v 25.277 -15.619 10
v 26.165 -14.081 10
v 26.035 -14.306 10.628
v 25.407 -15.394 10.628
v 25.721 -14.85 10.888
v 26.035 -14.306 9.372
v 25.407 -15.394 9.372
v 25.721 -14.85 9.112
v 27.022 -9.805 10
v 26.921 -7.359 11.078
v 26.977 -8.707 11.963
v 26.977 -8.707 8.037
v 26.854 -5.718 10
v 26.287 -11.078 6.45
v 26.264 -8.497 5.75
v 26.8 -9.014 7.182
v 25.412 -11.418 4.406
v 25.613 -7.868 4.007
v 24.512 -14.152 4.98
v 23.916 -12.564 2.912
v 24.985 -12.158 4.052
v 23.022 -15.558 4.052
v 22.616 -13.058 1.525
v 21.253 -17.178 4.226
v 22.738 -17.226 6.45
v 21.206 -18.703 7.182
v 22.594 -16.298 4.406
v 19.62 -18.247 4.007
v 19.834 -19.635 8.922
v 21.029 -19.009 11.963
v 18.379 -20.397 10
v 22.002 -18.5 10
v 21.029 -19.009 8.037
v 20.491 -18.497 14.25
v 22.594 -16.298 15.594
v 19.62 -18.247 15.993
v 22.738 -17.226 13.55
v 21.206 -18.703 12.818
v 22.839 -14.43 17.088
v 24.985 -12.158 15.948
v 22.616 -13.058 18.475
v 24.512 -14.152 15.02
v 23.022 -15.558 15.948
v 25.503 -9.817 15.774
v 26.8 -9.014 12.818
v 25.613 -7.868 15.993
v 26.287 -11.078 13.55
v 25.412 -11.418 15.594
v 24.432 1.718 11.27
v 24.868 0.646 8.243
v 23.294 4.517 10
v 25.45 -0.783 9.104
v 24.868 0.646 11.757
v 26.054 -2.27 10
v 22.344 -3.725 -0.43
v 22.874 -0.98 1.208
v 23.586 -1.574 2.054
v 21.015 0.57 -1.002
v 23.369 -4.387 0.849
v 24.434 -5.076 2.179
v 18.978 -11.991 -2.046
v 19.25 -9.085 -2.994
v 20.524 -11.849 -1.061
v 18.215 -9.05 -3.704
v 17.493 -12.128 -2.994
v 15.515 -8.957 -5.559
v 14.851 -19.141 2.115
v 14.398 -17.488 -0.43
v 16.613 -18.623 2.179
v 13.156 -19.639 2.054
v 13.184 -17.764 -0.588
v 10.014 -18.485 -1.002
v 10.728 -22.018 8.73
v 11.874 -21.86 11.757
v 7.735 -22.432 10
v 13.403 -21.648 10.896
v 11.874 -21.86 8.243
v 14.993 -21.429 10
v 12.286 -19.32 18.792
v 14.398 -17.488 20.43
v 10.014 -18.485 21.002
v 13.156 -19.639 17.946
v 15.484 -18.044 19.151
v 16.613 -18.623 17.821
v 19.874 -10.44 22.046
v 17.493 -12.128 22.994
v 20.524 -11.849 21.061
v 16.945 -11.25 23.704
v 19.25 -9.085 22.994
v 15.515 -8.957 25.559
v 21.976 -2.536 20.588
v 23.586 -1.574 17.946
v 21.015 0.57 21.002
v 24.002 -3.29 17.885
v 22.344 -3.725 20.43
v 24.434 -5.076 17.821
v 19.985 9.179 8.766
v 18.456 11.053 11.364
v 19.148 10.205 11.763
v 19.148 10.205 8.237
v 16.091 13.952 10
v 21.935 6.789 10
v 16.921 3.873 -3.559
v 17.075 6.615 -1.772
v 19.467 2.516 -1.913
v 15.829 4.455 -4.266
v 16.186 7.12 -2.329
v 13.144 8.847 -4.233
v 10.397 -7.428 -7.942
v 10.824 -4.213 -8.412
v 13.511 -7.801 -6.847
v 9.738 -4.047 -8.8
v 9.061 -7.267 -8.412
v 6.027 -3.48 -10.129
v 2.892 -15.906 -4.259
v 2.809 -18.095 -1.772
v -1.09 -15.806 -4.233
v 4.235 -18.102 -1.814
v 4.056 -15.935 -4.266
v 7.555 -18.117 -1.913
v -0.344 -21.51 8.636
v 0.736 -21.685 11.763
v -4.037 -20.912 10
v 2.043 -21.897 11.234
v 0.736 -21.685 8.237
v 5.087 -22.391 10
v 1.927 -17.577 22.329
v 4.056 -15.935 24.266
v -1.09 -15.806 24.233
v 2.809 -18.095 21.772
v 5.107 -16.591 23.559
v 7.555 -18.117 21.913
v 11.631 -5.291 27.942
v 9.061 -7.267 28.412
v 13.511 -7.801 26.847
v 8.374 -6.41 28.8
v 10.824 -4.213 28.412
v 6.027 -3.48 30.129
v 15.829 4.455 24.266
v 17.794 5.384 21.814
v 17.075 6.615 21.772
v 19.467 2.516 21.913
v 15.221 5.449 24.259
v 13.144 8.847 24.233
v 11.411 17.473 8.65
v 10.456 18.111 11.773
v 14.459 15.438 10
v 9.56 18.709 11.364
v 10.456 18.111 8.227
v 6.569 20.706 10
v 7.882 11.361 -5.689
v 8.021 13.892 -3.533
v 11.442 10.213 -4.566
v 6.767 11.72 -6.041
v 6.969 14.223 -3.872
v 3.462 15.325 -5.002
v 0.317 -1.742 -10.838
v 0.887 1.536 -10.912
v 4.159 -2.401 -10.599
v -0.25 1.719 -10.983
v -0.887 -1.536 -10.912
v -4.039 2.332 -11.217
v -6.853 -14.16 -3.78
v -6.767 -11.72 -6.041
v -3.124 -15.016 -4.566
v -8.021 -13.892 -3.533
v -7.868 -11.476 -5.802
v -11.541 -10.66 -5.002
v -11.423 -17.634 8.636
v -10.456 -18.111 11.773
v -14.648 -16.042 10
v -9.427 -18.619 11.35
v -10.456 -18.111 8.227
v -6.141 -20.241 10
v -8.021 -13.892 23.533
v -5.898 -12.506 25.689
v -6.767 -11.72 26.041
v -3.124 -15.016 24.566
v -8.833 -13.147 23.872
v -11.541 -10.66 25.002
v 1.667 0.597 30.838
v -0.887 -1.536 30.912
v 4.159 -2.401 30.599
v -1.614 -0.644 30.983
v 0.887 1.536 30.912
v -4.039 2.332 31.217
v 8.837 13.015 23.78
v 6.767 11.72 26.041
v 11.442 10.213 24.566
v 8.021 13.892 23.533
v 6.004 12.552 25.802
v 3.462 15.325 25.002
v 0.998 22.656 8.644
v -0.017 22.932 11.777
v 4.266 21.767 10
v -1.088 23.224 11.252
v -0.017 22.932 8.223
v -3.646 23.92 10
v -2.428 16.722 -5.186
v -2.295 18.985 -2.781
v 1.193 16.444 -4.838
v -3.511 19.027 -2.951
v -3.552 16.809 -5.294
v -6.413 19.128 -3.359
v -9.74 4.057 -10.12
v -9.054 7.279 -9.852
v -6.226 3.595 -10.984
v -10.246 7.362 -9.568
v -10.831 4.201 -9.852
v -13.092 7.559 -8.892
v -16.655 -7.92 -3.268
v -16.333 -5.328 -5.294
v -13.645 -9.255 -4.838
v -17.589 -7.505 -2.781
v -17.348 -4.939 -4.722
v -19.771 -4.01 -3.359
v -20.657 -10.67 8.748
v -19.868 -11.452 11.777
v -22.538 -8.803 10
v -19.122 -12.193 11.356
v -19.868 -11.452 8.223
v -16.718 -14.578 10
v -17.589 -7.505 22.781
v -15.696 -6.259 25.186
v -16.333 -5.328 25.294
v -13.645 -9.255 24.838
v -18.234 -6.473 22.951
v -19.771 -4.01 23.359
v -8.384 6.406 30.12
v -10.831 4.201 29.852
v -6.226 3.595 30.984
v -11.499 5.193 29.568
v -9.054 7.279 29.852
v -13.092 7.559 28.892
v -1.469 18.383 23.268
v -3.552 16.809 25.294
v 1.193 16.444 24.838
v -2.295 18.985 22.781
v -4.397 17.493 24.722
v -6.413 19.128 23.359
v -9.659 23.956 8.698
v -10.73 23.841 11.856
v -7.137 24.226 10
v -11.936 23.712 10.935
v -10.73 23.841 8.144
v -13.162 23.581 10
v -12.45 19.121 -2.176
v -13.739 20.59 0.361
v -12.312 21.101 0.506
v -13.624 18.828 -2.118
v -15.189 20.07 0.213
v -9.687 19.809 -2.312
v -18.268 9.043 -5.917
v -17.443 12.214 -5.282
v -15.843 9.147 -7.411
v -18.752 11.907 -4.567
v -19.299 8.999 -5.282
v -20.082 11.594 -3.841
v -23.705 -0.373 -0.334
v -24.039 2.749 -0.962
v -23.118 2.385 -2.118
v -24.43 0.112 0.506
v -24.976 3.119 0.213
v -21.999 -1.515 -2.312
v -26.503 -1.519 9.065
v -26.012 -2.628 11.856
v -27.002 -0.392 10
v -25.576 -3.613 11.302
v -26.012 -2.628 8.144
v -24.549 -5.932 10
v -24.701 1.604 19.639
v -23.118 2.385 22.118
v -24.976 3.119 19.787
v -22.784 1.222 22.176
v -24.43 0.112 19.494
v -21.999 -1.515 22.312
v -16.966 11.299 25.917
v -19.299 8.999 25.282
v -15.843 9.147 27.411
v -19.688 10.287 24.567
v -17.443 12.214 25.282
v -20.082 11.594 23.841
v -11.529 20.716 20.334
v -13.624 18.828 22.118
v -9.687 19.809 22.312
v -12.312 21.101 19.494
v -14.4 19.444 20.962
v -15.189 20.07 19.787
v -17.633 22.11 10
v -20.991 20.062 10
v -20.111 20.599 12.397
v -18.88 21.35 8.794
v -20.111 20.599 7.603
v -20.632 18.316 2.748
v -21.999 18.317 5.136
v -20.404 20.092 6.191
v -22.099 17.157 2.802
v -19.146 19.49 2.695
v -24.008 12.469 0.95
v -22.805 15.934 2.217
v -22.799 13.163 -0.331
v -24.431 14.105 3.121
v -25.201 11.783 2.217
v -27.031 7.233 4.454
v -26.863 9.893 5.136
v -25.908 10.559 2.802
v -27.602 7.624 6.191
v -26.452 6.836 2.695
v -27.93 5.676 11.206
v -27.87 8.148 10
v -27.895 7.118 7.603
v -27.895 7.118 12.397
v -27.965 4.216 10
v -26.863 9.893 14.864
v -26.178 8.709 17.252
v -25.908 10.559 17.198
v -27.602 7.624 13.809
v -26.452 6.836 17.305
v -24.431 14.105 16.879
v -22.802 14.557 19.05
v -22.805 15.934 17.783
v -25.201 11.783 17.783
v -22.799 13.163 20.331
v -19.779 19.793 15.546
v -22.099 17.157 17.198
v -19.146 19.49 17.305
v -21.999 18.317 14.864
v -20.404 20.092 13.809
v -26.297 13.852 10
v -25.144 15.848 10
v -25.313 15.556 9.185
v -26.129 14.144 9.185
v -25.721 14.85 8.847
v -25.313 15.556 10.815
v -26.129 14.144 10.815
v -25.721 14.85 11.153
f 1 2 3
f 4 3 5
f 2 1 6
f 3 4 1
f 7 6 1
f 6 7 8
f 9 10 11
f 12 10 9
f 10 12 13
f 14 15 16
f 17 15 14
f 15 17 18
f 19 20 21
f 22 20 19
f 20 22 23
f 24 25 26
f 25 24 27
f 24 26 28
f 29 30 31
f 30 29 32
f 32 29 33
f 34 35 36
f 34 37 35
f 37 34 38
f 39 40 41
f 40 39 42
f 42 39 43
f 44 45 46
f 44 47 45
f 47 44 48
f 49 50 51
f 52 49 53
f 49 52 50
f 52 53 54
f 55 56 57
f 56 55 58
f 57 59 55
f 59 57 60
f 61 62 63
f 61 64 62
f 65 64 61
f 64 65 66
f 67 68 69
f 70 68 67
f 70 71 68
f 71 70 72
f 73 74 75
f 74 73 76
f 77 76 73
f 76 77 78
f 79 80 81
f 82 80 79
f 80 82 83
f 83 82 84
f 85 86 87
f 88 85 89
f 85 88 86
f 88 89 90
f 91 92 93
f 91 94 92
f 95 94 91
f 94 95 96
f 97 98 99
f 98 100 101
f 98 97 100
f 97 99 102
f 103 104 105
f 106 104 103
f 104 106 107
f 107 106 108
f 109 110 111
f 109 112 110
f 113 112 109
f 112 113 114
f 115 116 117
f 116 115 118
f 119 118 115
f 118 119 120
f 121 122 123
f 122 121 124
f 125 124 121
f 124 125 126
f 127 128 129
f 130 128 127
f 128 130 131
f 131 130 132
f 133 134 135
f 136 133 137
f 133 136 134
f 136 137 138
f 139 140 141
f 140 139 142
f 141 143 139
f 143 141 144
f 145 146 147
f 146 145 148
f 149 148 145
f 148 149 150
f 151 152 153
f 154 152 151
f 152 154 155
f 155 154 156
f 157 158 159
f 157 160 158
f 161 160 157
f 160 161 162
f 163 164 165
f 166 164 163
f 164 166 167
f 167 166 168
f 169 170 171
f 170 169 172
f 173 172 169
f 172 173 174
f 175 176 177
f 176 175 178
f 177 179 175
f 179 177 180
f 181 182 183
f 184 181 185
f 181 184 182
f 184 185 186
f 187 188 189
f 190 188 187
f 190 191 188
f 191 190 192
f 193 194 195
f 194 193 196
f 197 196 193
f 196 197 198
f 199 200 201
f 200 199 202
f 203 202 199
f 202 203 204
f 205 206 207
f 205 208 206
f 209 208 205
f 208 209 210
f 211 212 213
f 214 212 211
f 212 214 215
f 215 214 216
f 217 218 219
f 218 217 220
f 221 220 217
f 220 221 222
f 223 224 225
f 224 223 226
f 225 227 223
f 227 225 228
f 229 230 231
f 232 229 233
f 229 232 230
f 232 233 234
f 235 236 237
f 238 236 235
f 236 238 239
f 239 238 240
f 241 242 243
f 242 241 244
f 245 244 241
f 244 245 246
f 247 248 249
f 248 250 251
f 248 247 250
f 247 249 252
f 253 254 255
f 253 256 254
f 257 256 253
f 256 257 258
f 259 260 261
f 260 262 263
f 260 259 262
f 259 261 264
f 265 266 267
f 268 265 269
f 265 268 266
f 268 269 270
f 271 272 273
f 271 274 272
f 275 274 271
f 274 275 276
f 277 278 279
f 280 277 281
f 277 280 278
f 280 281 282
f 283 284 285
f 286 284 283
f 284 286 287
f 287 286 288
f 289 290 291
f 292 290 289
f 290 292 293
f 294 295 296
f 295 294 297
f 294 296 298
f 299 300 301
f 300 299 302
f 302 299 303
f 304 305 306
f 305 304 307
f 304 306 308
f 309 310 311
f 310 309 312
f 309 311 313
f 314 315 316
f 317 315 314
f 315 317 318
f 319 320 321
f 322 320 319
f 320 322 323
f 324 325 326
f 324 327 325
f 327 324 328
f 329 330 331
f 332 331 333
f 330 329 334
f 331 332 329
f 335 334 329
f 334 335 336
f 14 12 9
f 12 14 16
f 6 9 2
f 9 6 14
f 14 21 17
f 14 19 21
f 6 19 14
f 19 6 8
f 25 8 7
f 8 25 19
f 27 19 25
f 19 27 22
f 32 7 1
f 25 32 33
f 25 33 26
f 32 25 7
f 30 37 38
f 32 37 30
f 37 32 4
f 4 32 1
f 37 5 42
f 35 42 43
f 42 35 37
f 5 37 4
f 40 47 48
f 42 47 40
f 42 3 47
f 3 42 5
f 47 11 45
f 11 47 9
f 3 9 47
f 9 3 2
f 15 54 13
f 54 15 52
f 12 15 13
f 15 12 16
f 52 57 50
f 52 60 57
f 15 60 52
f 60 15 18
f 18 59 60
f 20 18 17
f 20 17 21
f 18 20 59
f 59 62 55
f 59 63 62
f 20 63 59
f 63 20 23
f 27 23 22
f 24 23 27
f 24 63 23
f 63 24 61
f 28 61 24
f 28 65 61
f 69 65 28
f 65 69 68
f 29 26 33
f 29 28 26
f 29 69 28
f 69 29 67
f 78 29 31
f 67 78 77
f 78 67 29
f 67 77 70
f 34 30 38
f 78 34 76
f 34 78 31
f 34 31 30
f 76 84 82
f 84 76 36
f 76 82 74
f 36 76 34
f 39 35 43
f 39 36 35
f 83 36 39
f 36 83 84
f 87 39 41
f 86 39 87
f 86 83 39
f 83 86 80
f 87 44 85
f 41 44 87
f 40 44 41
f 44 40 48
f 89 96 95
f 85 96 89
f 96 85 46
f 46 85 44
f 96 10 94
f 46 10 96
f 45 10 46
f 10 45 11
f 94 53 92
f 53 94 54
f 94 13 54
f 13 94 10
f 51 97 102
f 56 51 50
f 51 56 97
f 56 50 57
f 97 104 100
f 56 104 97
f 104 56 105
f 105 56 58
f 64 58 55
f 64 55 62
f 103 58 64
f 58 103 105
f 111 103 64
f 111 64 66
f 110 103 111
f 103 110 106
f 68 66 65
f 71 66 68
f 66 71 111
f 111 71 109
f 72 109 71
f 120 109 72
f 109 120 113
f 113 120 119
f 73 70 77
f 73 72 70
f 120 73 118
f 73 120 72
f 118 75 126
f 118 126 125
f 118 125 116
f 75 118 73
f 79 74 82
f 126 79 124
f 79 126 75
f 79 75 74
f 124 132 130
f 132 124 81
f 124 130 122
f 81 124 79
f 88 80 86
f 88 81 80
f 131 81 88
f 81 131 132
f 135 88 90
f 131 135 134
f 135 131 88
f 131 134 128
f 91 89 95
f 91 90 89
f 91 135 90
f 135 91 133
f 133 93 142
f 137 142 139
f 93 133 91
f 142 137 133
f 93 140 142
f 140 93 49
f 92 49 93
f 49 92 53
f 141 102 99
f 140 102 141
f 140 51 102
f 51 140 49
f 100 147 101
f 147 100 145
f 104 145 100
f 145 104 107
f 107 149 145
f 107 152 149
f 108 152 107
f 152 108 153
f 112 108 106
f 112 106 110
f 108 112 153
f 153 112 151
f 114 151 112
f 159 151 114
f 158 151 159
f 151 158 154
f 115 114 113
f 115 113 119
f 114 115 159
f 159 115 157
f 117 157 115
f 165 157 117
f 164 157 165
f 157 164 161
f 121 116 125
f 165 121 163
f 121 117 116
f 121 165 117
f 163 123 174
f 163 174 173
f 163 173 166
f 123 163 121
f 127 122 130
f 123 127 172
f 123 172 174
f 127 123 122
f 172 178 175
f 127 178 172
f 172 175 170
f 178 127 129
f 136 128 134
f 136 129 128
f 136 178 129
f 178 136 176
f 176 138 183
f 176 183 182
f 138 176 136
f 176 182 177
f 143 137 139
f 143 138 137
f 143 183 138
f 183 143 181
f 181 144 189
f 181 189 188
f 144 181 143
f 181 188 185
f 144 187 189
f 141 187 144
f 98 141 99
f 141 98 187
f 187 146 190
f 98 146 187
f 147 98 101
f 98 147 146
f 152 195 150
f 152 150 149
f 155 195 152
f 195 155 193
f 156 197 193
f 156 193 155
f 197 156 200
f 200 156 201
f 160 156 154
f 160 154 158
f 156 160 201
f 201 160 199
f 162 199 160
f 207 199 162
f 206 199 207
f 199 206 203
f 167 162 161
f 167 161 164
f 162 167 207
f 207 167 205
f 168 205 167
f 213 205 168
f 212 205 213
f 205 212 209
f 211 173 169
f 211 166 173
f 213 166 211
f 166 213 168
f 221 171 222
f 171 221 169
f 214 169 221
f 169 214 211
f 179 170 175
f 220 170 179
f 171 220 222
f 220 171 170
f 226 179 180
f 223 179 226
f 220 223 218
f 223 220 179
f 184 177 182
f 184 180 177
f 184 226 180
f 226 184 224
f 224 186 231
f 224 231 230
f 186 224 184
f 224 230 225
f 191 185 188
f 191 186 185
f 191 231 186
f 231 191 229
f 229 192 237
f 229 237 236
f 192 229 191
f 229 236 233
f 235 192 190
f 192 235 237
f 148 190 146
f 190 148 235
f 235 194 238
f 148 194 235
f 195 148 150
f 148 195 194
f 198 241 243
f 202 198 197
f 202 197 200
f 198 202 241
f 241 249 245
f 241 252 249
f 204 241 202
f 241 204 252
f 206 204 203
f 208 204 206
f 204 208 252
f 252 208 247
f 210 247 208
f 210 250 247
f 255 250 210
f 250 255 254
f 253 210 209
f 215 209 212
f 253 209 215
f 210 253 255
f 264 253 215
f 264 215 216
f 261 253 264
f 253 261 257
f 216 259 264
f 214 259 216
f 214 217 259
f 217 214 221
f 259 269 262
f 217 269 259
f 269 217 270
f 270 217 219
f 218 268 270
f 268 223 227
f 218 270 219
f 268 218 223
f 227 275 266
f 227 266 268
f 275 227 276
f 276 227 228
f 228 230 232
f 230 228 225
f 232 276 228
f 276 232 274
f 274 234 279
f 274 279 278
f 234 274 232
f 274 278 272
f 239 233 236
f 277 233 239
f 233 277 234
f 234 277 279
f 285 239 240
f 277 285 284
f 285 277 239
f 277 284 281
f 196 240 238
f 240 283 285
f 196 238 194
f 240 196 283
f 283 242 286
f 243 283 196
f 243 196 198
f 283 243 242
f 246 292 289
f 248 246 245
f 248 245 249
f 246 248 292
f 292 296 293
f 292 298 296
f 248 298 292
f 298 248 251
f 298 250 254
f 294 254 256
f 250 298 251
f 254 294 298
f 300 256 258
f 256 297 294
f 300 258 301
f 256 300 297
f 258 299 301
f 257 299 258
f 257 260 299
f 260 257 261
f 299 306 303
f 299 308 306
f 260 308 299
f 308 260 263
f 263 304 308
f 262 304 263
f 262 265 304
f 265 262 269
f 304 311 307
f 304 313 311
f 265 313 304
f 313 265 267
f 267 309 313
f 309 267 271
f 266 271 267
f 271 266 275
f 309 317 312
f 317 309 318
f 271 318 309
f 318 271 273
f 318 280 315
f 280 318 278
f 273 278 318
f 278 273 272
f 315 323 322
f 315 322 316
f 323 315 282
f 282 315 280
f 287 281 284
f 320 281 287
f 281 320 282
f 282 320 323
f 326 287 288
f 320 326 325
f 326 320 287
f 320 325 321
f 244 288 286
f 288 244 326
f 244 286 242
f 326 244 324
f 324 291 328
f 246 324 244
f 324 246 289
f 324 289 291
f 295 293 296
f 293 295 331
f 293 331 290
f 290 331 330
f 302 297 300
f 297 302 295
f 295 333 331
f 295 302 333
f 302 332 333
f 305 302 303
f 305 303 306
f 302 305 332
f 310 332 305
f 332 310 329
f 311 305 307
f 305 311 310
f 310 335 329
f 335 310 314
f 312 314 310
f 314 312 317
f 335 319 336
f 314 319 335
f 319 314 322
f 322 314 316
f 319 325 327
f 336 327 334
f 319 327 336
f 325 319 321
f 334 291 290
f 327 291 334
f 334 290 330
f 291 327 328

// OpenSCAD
//Easter Egg Maker 2017 from Richard Swika
/* [Egg Symmetry] */
//2014-2017 Richard Swika -  Creative Commons - Attribution - Non-Commercial license.
//Initial Release 4/9/2017
//Rev A: 4/10/2017 
//  - Added Wallpaper Groups 9 of 17
// - Added ability to print decoration and egg separately for dual extrusion
//  - Fixed a few bugs; add/subtract were reversed; spacing edit box was missing from customizer
//

/* [Decoration] */

//Add or subtract decoration from egg (use feature depth to control amount)?
operation="subtract"; //[subtract,add,decoration_only,egg_only]

//Choose a feature to repeat?
feature="square"; //[sphere,star,dot,triangle,square,diamond,pentagon,hexagon,octagon]

//Set the relative size of the feature
size_of_feature=100; //[1:250]

//Number of horizontal loops; impacts pattern and render time (for larger values, use offline)
ucount=8; //[3:16]

//Number of vertical loops; impacts pattern and reander time (for larger values, use offline)
vcount=8; //[3:16]

//Set the relative depth of the feature
feature_depth=10; //

//Set the feature start angle (values like 0, 15, 30 and 45 work best)
start_angle=0; //

//How much feature rotation over the length of the egg (0 for none)?
feature_rotation=0; //

//Vary feature size (yes give a better appearance)?
proportional="yes"; //[yes,no]

/* [placement (wallpaper group) 9 of 17] */
//Select a wallpaper group to control symmetry (google wallpaper group for more information)
group="p1"; //[p1,p2,pm,pg,cm,pmm,pmg,pgg,p4]

//Set some X offset to control the effect of the wallpaper group on symmetrical features (%).
Xoffset=0; //[0:100]

//Set some Y offset to control the effect of the wallpaper group on symmetrical features (%).
Yoffset=0; //[0:100]

//Set some X scaling to control the effect of the wallpaper group on symmetrical features (%)
Xscaling=100; //[10:100]

//Set some Y scaling to control the effect of the wallpaper group on symmetrical features (%)
Yscaling=100; //[10:100]

/* [Size and Shape] */
//Length of the egg (mm)?.
egg_length=60; //[30:200]

//What shape egg? (use 7 for a hen egg; 0 for a sphere; 100 for a blimp)
egg_shape=7; //[0:100]

//What percentage of the interior should be hollow (0 for totally solid)
interior=85; //[0:95]

//Do you want the inside to be smooth or decorated? (hollow bisected eggs only)
inside="smooth"; //[smooth,decorated]

/* [Printing] */
//Do you want it bisected? (IMPORTANT: YES for printing, NO during preview.)
bisect="no"; //[yes,no]

//Do you want to add a joiner to hold the egg together? (hollow bisected eggs only)
joiner="attached"; //[attached,detached,none]

//Set the spacing between parts on the build plate in mm
spacing=2; //[2:10]

/* [Hidden] */
// preview[view:top, tilt:top]
tiny=0.001;

//set true to turn off the demo egg so you can use the modules instead
moduleMode=false; //[false,true];

//when false the egg will have quads where possible instead of all trigons
//this can lead to problems with non-plannar surfaces when using csg
//so only use it true if when not using a base
allTrigon=true; //[false,true]

function ud(ui) = ui*360/ucount;
function vd(vi) = vi*180/vcount;

//egg equation adapted from http://www16.ocn.ne.jp/~akiko-y/Egg
//(y^2 + z^2)^2=4z^3 + (4-4c)zy^2
// c=0.7 produces an almost perfect hen egg outline+
// c=0 produces a perfect sphere
// c>1 produces an elongated egg shape
//z ranges from 0 to 1
function egg_outline(c,z)= z >=1 ? 0 : (sqrt(4-4*c-8*z+sqrt(64*c*z+pow(4-4*c,2)))*sqrt(4*z)/sqrt(2))/4;
//map the egg's surface from uv to xyz with these functions
function x(ui,r) = r * sin(ud(ui));
function y(ui,r) = r * cos(ud(ui));
function z(vi,r) = r * cos(vd(vi));	
function n(vi,r) = r * sin(vd(vi));	
function zi(vi) = (1+cos(vd(vi)))/2;	
//polar to rectanglar
function P2R(p)=[p[0]*cos(p[1]),p[0]*sin(p[1])];

//first deriviative of egg equation used to calculate surface normal
function egg_slope(c,z)= -((4*z+c-1)*sqrt(c*(4*z+c-2)+1)+c*(2-6*z)-pow(c,2)-1) / (pow(2,3/2)*sqrt(z)*sqrt(c*(4*z+c-2)+1)*sqrt(sqrt(c*(4*z+c-2)+1)-2*z-c+1));
function egg_surface_angle(c,z)=atan(egg_slope(c,z));

center = 0.5; //set to 1 to center at small end; 0 to center on fat end

//to avoid degenerate geometry at the poles we can not use quads 
//so we will generate phantom points as if we were using quads, but use tris instead 
//just to simplify indexing, but will only link faces to a single point at each pole
//but we will use the phantom points to calculate average displacement at each pole
//lets make an egg
points = [ for (vi=[0:vcount]) 
    for (ui = [0 : ucount-1]) 
        let (r=egg_outline(egg_shape/10,1-zi(vi))) 
                    [x(ui,r), y(ui,r),(zi(vi))-center]];
//echo(points=points);
faces =  (allTrigon)     
 ? [ for (vi=[0:vcount-1]) for (ui = [0:ucount-1])  for (p=[0:1])
    (vi==0)&&(p==0) ? [vi*ucount,ui+(vi+1)*ucount,(ui+1) % ucount+(vi+1)*ucount]
    : (vi==vcount-1)&&(p==0) ? [(ui+1) % ucount+vi*ucount,ui+vi*ucount,(vi+1)*ucount]
    : (p==0) ? [(ui+1) % ucount+vi*ucount,ui+vi*ucount,ui+(vi+1)*ucount]
    :[(ui+1) % ucount+vi*ucount,ui+(vi+1)*ucount,(ui+1)%ucount+(vi+1)*ucount]] 
: [ for (vi=[0:vcount-1]) for (ui = [0:ucount-1])  
    (vi==0) ? [vi*ucount,ui+(vi+1)*ucount,(ui+1) % ucount+(vi+1)*ucount]
    : (vi==vcount-1) ? [(ui+1) % ucount+vi*ucount,ui+vi*ucount,(vi+1)*ucount]
    : [(ui+1) % ucount+vi*ucount,ui+vi*ucount,ui+(vi+1)*ucount,(ui+1)%ucount+(vi+1)*ucount]] ;
//echo(faces=faces);

$fn=6;
//an adjustable Egg
module Egg(egg_length=egg_length,egg_shape=egg_shape){
     scale (egg_length) rotate([0,0,0]) polyhedron(points=points,faces=faces);
}    
module star2D(r1=100,r2=35,twist=0){
		d=360/10; 
		 points=[P2R([r1,d*0+twist]),P2R([r2,d*1]),
							P2R([r1,d*2+twist]),P2R([r2,d*3]),
							P2R([r1,d*4+twist]),P2R([r2,d*5]),
							P2R([r1,d*6+twist]),P2R([r2,d*7]),
							P2R([r1,d*8+twist]),P2R([r2,d*9])];
		color("yellow",0.5)  rotate(90) polygon(points=points,convexity=4);
}
module pip (size_of_feature=20,feature_depth=5) {
    scale(0.5*size_of_feature*[1,1,feature_depth/10]) {
        translate([.7,.7,0]) cube(0.75,center=true);
        rotate([90,0,-45]) cylinder(r=.3,h=2,center=true);
        translate([-.7,-.7,0]) sphere(0.5);
    }
}
 
module shape(){
  scale(egg_length/50) //make proportional to size of egg  
  if (feature=="star"){linear_extrude(height=feature_depth/10,twist=0,center=true,convexity=10) star2D(r1=size_of_feature/20,r2=size_of_feature/40);}
  else if (feature=="dot"){cylinder(d=size_of_feature/5,h=feature_depth/10,$fn=16);}
  else if (feature=="sphere"){sphere(d=size_of_feature/10,h=feature_depth/10,$fn=6);}
  else if (feature=="triangle"){cylinder(d=size_of_feature/10,h=feature_depth/10,$fn=3);}
  else if (feature=="square"){cube([size_of_feature/10,size_of_feature/10,feature_depth/10],center=true);}
  else if (feature=="diamond"){rotate([45,45,0]) cube([size_of_feature/10,size_of_feature/10,feature_depth/10],center=true);}
  else if (feature=="pentagon"){cylinder(d=size_of_feature/10,h=feature_depth/10,$fn=5);}
  else if (feature=="hexagon"){cylinder(d=size_of_feature/10,h=feature_depth/10,$fn=6);}
  else if (feature=="octagon"){cylinder(d=size_of_feature/10,h=feature_depth/10,$fn=8);}
  else if (feature=="pip"){pip(size_of_feature/10,feature_depth);}
}      

//Makes a solid object into hollow shell of its former self
//the size of the inside is factor * size of outside 
module hollow_shell(factor=interior/100){   
	if ((factor<=0) ) children();
	else union(){
      render() 
	  difference()  {
		translate([0,0,0.01])
		children();
        if (inside=="smooth") {scale (factor) Egg();}
        else {scale(factor) children();}
	  }
	}
}

//bisect object down the middle and postion the two halfs for printing
module bisect(){
        render()
		difference(){
			rotate([0,0,0]) union(){
				translate([egg_length/3+2,0,0])children();
				translate([-egg_length/3-2,0,0]) rotate([180,0,0]) children();
			}
			translate([0,0,-1-egg_length/4])
				cube([egg_length*2.1,egg_length*1.05,2+egg_length/2],center=true);
		}
}

module SolidEasterEgg(){
    render()
    if (operation=="add") {
        union()
            {Egg();
            EggDeco();
            }
        }
    else if (operation=="egg_only") Egg();
    else if (operation=="decoration_only")  EggDeco();
    else {
        difference()
            {Egg();
            EggDeco();
            }
     }
}

module HollowEasterEgg(){
   hollow_shell() SolidEasterEgg();
}

module bisectAndJoiner(){
   render()
    translate([egg_length*egg_outline(egg_shape/10,0.5)+spacing/2,0,joiner=="attached" ? egg_length/20 : 0]) union(){
        //half of egg
       difference(){
                children();
                translate([0,0,-1-egg_length/4])
                    cube([egg_length*2.1,egg_length*1.05,2+egg_length/2],center=true);
        }
        //joiner
        if (joiner!="none") {
            translate([joiner=="detached" ? 2*egg_length*egg_outline(egg_shape/10,0.5)+spacing:0,0]) scale((interior+1)/100) intersection(){
                $fn=32;
                children();
                cylinder(r=egg_length*egg_outline(egg_shape/10,0.5)*.99,h=egg_length/10,center=true);
            }
        }
    }
    //other half of egg
     render()
	translate([-egg_length*egg_outline(egg_shape/10,0.5)-spacing/2,0,0]) difference(){
			rotate([180,0,0]) children();
			translate([0,0,-1-egg_length/4])
				cube([egg_length*2.1,egg_length*1.05,2+egg_length/2],center=true);
		}    
}

//wallpaper group coding follows
function even(i)= i % 2;
module reflectX(enable=1) {if (enable) {mirror([1,0,0]) children();} else {children();}}
module reflectY(enable=1) {if (enable) {mirror([0,1,0]) children();} else {children();}}
  
module wallpaper(group="p1",p=[0,0,0]) {
//    echo(p);
    if (group=="p1") /*translation */
        {children();}
    else if (group=="p2")  /*180 degree rotation*/
        {rotate([0,0,180*even(p.x)]) children();}
    else if (group=="pm") /*reflection*/
       {reflectX(even(p.x)) children();}
    else if (group=="pg") /*glide reflection*/
      {reflectX(even(p.y)) children();}
    else if (group=="cm") /*reflection + glide reflection*/
      {scale([(1-2*(p.x % 2))*(1-2*(p.y % 2)),1,1]) children();}
   else if (group=="pmm") /*reflection + reflection*/
      {scale([(1-2*(p.x % 2)),(1-2*(p.y % 2)),1]) children();}
   else if (group=="pmg") /*reflection + 180 degree rotation*/
      {scale([(1-2*(p.x % 2)),((1-2*(p.x % 2)))*(1-2*((p.y) % 2)),1]) children();}
   else if (group=="pgg") /*glide reflection + 180 degree rotation*/
      {rotate([0,0,180*((p.x+p.y) % 2)]) scale([1-2*(p.x % 2),1,1]) children();}
//    else if (group=="cmm") /*reflection + reflection + glide reflection*/
//      {wallpaper("cm",p) 
//          tile("pmm",[1,2,0],[1,2,0]) children();}
   else if (group=="p4") /*90 degree rotation*/
     {rotate([0,0,even(p.x)*-90+even(p.y)*90+even(p.x)*even(p.y)*180]) children();}
 }
 
 //This is the module that applies decorations by wallpaper group
module EggDeco(){
    for (p=points) {translate(p*egg_length) rotate([90+egg_surface_angle(egg_shape/10,1-p.z-center),0,atan2(-p.x,p.y)]) scale(proportional=="yes" ? 0.5 + 2*egg_outline(egg_shape/10,1-p.z-center):1)
        rotate([0,0,start_angle+feature_rotation*(1-p.z-center)]) wallpaper(group,[ucount-ucount*((atan2(p.x,-p.y)+180)/360),vcount*acos(2*p.z)/180,0]) 
        translate([egg_length*Xoffset/(100*ucount),egg_length*Yoffset/(100*vcount),0]) scale([Xscaling/100,Yscaling/100,1]) shape();}
}


//bisect() hollow_shell() Egg();
//bisect() HollowEasterEgg();
if (!moduleMode) {
    if (bisect=="yes") {bisectAndJoiner() HollowEasterEgg();}
    else {translate([0,0,10])rotate([0,90,-30]) SolidEasterEgg();}
}
